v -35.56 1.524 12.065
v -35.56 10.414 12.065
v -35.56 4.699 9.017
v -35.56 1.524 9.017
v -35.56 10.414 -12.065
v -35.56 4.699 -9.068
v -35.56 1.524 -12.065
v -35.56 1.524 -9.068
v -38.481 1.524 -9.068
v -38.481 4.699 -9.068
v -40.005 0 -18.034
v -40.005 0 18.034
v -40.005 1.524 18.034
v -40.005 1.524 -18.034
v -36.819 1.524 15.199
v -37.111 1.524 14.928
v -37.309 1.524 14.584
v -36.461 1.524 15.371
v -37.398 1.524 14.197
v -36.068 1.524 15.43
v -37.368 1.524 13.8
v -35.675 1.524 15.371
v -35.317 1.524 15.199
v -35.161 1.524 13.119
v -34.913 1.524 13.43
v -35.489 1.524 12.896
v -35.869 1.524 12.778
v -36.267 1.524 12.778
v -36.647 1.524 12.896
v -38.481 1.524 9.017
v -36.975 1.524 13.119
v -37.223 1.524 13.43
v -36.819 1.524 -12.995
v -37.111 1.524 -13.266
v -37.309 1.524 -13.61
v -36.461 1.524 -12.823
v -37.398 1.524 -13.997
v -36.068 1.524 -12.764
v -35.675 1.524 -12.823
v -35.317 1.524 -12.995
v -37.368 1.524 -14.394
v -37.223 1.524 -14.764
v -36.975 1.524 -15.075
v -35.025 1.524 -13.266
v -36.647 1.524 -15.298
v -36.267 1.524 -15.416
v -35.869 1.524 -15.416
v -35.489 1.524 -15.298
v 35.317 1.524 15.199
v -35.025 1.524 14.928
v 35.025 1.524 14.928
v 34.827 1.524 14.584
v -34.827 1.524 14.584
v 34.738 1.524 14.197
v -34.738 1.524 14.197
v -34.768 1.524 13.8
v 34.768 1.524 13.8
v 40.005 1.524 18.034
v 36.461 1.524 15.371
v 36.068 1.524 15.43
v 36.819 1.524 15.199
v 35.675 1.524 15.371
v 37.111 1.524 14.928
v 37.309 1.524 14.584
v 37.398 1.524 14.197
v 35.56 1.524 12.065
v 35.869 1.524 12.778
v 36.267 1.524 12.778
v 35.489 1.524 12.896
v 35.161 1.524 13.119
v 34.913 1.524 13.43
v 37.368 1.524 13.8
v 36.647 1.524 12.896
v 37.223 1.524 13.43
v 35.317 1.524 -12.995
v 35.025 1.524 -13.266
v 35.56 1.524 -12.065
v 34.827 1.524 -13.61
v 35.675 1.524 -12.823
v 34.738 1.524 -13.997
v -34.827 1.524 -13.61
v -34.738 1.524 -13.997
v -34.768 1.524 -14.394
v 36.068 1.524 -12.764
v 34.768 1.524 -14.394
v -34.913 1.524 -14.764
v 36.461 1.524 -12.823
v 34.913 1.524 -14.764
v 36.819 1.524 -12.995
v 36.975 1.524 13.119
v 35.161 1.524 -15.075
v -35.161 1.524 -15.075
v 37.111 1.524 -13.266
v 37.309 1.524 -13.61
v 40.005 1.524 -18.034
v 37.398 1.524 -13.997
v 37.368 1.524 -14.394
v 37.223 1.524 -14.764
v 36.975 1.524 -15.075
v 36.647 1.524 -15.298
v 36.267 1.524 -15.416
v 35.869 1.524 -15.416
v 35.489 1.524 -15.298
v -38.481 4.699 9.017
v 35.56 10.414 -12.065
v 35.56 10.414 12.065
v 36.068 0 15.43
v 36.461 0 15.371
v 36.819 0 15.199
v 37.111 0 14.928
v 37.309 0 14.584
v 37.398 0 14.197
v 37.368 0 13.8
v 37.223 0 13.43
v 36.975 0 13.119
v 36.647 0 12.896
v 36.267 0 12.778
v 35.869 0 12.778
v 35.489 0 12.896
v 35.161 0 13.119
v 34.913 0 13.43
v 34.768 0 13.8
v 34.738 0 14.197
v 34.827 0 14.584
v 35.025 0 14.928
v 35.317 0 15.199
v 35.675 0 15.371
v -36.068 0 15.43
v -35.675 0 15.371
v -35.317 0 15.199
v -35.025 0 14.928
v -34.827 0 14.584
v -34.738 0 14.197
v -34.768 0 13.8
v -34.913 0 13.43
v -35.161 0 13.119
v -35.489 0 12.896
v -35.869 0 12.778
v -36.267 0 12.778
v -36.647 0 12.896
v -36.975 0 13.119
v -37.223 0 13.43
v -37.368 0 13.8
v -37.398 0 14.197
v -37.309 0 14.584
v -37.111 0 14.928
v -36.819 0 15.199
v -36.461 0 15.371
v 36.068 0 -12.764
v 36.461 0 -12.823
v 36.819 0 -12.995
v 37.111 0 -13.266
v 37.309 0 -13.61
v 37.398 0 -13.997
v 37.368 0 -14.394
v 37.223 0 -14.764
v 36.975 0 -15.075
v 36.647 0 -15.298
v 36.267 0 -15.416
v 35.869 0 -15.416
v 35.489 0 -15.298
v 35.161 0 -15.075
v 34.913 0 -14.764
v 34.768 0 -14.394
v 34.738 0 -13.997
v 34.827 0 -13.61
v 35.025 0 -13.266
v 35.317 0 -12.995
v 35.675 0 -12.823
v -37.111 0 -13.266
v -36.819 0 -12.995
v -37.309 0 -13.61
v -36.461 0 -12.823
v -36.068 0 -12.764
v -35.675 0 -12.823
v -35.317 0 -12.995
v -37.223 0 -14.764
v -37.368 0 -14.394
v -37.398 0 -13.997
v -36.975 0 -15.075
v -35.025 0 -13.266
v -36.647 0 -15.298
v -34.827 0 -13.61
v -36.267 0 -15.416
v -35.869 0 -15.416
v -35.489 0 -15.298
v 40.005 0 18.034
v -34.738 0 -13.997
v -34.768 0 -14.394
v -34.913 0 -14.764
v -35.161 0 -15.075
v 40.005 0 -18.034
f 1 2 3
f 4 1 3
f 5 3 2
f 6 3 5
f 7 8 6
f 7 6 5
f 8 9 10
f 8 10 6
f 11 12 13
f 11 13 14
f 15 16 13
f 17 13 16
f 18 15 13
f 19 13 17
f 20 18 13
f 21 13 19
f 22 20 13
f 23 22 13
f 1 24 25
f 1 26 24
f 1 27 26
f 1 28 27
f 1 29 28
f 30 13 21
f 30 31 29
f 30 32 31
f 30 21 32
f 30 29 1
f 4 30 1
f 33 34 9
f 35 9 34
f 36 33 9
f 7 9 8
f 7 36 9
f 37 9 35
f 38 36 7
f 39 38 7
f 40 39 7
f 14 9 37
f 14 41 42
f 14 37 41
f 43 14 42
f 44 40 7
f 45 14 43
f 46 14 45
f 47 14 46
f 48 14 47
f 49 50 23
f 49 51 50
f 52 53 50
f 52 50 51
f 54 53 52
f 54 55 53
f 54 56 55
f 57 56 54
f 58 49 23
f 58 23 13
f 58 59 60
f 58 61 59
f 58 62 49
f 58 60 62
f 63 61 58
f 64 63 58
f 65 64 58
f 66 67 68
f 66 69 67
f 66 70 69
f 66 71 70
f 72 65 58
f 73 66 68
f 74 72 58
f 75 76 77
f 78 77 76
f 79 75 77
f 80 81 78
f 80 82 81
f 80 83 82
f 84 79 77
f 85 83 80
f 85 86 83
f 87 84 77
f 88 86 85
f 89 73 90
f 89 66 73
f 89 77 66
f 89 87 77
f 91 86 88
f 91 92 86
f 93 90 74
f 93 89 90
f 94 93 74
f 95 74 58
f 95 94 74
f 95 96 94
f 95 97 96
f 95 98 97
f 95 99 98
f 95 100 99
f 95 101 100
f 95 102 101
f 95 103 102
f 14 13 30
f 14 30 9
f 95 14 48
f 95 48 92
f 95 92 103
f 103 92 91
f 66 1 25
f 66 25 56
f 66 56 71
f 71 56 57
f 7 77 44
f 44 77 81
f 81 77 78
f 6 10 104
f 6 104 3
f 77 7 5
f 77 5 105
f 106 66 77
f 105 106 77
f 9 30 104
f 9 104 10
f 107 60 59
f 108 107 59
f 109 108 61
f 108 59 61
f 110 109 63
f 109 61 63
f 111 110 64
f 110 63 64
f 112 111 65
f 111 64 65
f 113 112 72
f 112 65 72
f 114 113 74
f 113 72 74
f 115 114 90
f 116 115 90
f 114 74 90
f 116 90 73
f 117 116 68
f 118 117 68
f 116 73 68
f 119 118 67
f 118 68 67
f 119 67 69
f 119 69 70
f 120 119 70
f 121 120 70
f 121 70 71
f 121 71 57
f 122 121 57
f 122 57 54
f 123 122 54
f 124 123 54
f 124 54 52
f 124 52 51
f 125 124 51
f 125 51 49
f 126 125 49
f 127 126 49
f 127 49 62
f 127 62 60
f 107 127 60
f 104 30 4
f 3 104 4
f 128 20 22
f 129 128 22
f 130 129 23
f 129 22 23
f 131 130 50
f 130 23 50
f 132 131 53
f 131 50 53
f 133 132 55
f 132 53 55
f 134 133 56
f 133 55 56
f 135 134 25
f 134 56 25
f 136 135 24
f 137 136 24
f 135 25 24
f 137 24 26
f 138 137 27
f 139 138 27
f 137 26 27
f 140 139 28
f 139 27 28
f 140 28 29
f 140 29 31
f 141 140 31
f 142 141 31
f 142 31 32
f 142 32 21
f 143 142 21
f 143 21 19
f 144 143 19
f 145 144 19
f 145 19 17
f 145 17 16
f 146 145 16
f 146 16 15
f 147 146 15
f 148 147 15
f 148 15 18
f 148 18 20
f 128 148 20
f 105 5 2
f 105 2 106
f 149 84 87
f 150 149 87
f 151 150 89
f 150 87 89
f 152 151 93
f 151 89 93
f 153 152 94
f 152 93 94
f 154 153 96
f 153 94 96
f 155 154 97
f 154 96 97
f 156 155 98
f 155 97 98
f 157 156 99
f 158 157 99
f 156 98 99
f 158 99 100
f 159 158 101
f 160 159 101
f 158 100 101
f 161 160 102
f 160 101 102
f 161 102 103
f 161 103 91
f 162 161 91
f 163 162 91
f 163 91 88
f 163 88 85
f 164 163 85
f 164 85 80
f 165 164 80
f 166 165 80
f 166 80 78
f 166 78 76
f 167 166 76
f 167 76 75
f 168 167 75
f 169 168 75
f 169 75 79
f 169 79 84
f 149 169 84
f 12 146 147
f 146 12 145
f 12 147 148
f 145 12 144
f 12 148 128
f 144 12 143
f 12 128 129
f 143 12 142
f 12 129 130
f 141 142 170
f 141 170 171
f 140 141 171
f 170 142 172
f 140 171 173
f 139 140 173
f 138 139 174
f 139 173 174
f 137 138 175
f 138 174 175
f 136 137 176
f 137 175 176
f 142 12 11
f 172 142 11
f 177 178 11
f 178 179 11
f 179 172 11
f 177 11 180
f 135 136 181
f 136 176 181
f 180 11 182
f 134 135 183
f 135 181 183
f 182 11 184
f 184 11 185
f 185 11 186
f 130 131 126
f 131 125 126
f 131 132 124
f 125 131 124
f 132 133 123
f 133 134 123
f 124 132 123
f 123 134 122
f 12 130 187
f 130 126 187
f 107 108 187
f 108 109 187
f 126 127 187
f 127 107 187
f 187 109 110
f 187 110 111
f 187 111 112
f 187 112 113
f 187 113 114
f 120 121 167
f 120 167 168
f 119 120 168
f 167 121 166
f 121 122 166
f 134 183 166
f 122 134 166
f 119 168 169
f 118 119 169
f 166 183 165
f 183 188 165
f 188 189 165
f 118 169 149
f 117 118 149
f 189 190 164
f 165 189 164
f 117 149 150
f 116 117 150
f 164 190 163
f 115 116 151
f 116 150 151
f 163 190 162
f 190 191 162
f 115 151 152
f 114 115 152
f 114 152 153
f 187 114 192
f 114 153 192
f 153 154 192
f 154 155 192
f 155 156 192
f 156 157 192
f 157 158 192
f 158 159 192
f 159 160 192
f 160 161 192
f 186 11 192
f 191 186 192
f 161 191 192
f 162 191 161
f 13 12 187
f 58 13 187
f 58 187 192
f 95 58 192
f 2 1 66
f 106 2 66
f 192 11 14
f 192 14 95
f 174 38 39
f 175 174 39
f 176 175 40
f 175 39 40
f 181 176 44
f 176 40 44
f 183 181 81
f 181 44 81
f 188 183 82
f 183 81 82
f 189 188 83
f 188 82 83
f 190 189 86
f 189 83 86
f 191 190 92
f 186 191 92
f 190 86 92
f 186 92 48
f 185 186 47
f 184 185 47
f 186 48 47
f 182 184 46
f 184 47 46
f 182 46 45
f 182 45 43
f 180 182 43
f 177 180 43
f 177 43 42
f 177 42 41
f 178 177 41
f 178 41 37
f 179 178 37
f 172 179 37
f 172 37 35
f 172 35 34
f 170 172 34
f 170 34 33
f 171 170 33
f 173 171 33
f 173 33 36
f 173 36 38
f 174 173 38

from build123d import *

# Parameters (mm, degrees)
SKETCH1_W           = 80.01
SKETCH1_H           = 36.068
BOSS_EXTRUDE1_DEPTH = 1.524
CUT_EXTRUDE1_REACH  = 45.908
SKETCH2_R           = 1.3335
SKETCH3_W           = 71.12
SKETCH3_H           = 24.13
BOSS_EXTRUDE2_DEPTH = 8.89
SKETCH4_W           = 2.921
SKETCH4_H           = 18.0848
BOSS_EXTRUDE3_DEPTH = 3.175


with BuildPart() as part:
    # Sketch1 → Boss-Extrude1 (new body)
    with BuildSketch(Plane(origin=(0, 0, 0), x_dir=(1, 0, 0), z_dir=(0, 1, 0))):
        Rectangle(SKETCH1_W, SKETCH1_H)
    extrude(amount=BOSS_EXTRUDE1_DEPTH)

    # Sketch2 → Cut-Extrude1 (cut, up to next)
    with BuildSketch(Plane(origin=(0, 1.524, 0), x_dir=(1, 0, 0), z_dir=(0, 1, 0)), mode=Mode.PRIVATE) as cut_extrude1_sk1:
        with Locations(Location((-36.068, 14.097, 0), (0, 0, 270))):
            Circle(SKETCH2_R)
    cut_extrude1_tool1 = extrude(cut_extrude1_sk1.sketch, amount=-CUT_EXTRUDE1_REACH, mode=Mode.PRIVATE) & part.part
    # Sketch2 → Cut-Extrude1 (cut, up to next)
    with BuildSketch(Plane(origin=(0, 1.524, 0), x_dir=(1, 0, 0), z_dir=(0, 1, 0)), mode=Mode.PRIVATE) as cut_extrude1_sk2:
        with Locations(Location((36.068, 14.097, 0), (0, 0, 270))):
            Circle(SKETCH2_R)
    cut_extrude1_tool2 = extrude(cut_extrude1_sk2.sketch, amount=-CUT_EXTRUDE1_REACH, mode=Mode.PRIVATE) & part.part
    # Sketch2 → Cut-Extrude1 (cut, up to next)
    with BuildSketch(Plane(origin=(0, 1.524, 0), x_dir=(1, 0, 0), z_dir=(0, 1, 0)), mode=Mode.PRIVATE) as cut_extrude1_sk3:
        with Locations(Location((36.068, -14.097, 0), (0, 0, 270))):
            Circle(SKETCH2_R)
    cut_extrude1_tool3 = extrude(cut_extrude1_sk3.sketch, amount=-CUT_EXTRUDE1_REACH, mode=Mode.PRIVATE) & part.part
    # Sketch2 → Cut-Extrude1 (cut, up to next)
    with BuildSketch(Plane(origin=(0, 1.524, 0), x_dir=(1, 0, 0), z_dir=(0, 1, 0)), mode=Mode.PRIVATE) as cut_extrude1_sk4:
        with Locations(Location((-36.068, -14.097, 0), (0, 0, 270))):
            Circle(SKETCH2_R)
    cut_extrude1_tool4 = extrude(cut_extrude1_sk4.sketch, amount=-CUT_EXTRUDE1_REACH, mode=Mode.PRIVATE) & part.part
    add(cut_extrude1_tool1.solids().sort_by_distance((-36.068, 1.524, -14.097))[0], mode=Mode.SUBTRACT)
    add(cut_extrude1_tool2.solids().sort_by_distance((36.068, 1.524, -14.097))[0], mode=Mode.SUBTRACT)
    add(cut_extrude1_tool3.solids().sort_by_distance((36.068, 1.524, 14.097))[0], mode=Mode.SUBTRACT)
    add(cut_extrude1_tool4.solids().sort_by_distance((-36.068, 1.524, 14.097))[0], mode=Mode.SUBTRACT)

    # Sketch3 → Boss-Extrude2 (add)
    with BuildSketch(Plane(origin=(0, 1.524, 0), x_dir=(1, 0, 0), z_dir=(0, 1, 0))):
        Rectangle(SKETCH3_W, SKETCH3_H)
    extrude(amount=BOSS_EXTRUDE2_DEPTH)

    # Sketch4 → Boss-Extrude3 (add)
    with BuildSketch(Plane(origin=(0, 1.524, 0), x_dir=(1, 0, 0), z_dir=(0, 1, 0))):
        with Locations((-37.0205, 0.0254)):
            Rectangle(SKETCH4_W, SKETCH4_H)
    extrude(amount=BOSS_EXTRUDE3_DEPTH)


solid = part.part
